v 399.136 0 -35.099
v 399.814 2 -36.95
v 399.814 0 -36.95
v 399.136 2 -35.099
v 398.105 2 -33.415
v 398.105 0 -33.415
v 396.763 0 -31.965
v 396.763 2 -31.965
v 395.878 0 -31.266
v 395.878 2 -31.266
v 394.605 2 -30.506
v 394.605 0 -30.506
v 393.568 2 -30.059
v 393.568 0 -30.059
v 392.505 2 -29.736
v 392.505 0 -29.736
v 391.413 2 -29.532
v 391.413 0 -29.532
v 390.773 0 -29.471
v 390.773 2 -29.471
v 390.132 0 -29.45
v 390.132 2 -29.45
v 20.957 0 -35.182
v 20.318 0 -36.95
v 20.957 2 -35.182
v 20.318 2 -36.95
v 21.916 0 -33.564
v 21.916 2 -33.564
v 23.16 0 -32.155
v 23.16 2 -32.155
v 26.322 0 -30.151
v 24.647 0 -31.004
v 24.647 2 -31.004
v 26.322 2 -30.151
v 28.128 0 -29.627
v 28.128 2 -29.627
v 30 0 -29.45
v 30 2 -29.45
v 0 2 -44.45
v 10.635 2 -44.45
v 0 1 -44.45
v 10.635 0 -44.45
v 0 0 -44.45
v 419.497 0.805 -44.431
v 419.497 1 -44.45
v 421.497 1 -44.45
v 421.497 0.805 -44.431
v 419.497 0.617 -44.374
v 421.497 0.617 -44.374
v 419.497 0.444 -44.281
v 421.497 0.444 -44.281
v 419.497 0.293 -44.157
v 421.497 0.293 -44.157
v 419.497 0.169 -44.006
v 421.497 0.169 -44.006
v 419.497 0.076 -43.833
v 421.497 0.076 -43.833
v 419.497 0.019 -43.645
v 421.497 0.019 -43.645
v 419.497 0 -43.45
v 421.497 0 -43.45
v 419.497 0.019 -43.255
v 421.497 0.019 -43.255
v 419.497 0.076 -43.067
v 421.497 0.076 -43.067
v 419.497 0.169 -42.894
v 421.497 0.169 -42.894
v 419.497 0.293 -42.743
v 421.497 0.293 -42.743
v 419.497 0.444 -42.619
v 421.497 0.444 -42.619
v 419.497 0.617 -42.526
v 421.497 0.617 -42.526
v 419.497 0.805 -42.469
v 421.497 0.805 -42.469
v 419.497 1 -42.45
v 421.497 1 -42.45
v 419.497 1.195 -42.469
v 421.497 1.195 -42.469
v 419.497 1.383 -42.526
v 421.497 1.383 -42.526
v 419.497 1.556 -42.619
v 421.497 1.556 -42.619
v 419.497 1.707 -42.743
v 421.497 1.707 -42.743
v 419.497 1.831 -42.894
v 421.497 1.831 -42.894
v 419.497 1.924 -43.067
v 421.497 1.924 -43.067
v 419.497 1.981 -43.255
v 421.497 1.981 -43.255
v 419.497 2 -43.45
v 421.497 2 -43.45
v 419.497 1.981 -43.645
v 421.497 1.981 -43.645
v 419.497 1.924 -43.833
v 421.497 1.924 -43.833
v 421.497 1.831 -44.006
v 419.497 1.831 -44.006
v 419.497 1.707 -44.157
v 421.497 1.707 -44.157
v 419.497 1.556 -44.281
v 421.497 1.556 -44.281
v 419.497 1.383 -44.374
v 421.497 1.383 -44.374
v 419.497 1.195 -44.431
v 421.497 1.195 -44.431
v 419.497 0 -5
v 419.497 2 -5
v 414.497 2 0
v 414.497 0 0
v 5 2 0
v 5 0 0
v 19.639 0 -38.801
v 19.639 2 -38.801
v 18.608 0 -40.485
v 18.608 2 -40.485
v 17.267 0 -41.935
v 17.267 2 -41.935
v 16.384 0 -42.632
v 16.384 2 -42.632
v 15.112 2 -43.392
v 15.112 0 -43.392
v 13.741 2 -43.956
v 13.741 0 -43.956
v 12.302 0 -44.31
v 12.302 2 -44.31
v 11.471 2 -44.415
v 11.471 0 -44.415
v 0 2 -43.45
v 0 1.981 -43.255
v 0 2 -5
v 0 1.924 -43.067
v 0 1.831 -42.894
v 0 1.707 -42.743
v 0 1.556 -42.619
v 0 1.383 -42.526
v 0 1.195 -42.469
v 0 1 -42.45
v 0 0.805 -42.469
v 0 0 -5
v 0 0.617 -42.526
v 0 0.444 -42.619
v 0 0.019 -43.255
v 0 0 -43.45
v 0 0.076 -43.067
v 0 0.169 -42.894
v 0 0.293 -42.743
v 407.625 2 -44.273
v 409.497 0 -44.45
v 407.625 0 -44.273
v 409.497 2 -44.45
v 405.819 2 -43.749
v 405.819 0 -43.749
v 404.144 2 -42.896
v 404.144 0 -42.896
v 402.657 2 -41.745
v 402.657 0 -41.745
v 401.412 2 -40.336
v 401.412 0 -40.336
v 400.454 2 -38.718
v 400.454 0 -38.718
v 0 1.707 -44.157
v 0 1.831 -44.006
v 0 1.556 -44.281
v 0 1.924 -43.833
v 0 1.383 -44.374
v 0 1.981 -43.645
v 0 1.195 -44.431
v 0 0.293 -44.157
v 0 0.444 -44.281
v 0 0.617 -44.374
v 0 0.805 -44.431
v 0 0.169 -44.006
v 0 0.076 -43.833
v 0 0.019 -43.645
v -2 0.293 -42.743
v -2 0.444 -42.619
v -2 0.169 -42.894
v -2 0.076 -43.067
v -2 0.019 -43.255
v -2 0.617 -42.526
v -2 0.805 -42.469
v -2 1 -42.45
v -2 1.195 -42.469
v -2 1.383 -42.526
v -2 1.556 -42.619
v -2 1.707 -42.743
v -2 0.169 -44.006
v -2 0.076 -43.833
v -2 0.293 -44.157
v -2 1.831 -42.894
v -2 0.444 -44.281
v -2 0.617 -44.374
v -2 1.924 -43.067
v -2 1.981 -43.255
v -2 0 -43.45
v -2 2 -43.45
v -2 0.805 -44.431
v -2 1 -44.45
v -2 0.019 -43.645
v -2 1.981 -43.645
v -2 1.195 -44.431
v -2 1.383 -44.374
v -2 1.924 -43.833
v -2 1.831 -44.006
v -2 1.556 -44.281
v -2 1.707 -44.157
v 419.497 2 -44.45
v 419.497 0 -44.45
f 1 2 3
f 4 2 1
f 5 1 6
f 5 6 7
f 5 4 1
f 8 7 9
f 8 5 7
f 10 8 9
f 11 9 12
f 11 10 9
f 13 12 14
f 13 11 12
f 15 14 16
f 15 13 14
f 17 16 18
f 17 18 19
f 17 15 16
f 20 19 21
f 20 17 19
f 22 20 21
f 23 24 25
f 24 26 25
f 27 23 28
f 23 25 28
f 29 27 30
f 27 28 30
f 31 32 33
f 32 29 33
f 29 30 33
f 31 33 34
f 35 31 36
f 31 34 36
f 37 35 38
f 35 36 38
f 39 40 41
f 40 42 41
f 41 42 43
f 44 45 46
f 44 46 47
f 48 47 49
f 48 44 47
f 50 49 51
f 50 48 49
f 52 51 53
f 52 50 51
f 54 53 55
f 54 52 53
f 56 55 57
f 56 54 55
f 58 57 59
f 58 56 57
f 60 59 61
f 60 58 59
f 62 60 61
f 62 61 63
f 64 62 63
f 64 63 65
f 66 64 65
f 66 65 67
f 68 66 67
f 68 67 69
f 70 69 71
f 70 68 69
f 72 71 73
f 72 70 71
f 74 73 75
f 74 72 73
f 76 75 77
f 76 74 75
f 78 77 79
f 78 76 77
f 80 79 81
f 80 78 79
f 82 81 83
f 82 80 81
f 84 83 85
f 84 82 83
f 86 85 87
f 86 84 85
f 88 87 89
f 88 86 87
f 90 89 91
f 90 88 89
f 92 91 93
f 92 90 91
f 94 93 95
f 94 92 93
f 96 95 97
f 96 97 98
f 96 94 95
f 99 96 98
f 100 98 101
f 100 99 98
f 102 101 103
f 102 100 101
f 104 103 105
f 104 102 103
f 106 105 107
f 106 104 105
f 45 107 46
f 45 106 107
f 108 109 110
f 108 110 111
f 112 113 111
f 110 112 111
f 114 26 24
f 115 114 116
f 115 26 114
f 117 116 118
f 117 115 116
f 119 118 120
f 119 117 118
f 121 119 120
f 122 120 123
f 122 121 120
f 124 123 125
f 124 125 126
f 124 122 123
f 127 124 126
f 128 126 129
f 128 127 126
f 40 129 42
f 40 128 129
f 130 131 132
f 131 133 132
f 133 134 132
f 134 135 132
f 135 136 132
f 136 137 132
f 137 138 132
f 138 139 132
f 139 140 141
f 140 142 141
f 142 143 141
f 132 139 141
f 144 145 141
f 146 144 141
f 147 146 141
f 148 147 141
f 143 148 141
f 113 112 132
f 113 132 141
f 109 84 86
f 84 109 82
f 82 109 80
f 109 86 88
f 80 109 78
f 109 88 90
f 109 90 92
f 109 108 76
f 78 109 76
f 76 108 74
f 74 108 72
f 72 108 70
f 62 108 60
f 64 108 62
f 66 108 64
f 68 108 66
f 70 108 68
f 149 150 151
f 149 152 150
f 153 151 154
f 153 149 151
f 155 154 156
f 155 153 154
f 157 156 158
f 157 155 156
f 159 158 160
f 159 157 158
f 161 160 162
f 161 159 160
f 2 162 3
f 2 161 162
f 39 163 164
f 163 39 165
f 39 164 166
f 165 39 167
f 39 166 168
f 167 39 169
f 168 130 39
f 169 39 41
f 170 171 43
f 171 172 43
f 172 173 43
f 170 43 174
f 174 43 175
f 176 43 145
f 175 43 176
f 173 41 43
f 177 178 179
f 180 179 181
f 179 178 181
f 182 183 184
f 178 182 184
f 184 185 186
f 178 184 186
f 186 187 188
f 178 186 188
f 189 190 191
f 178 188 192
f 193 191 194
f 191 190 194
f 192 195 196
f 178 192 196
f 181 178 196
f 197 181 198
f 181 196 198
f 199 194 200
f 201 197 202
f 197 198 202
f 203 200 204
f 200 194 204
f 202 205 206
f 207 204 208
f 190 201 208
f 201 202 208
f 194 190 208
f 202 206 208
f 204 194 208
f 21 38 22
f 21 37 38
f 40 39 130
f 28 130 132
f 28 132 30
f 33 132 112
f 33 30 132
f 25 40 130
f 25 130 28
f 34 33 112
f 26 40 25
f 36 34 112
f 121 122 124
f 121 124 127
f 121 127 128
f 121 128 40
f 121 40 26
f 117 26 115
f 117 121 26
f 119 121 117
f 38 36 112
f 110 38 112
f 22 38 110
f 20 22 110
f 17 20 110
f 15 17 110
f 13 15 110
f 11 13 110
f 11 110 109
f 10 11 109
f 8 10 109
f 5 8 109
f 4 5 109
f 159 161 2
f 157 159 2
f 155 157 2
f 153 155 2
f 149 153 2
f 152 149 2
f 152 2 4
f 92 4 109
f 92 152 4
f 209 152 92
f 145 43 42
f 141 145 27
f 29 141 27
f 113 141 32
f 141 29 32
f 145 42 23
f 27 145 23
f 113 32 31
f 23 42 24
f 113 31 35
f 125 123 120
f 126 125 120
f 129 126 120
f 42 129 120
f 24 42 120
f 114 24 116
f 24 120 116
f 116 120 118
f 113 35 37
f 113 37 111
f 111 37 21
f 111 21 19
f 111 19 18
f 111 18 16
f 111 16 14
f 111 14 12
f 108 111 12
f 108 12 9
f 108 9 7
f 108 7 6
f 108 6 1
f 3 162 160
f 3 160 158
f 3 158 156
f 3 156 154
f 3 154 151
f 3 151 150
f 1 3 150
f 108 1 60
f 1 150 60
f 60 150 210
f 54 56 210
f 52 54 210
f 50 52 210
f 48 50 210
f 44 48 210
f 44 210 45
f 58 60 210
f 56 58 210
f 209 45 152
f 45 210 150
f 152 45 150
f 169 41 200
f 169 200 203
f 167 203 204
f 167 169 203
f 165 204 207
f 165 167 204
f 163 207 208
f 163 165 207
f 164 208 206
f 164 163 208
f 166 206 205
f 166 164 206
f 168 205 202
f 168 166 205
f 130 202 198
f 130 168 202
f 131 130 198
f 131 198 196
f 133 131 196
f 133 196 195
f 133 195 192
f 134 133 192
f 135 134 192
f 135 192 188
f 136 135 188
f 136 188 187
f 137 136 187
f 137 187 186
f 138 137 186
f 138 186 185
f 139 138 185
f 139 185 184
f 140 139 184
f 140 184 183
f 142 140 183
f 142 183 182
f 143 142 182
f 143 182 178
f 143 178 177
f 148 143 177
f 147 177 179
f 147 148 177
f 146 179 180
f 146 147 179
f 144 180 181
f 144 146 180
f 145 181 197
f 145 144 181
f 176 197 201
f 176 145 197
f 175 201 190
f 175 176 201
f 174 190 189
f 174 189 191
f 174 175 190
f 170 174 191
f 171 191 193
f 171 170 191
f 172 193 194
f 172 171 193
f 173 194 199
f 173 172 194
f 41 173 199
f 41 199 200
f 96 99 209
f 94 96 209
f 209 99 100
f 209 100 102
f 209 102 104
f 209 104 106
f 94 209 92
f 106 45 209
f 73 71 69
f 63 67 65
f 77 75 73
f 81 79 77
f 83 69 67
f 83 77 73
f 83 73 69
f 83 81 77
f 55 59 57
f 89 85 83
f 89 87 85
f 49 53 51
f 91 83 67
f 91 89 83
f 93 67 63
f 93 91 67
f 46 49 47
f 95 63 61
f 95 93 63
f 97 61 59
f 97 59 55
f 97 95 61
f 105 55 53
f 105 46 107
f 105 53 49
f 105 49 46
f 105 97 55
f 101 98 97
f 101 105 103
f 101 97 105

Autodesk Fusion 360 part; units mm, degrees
sketch "Sketch1" plane through (0, 0, 0) normal (0, 1, 0) x (1, 0, 0)
  line L0 (0, 0) -> (419.4969, 0)
  line L1 (419.4969, 0) -> (419.4969, 44.45)
  line L2 (419.4969, 44.45) -> (0, 44.45)
  line L3 (0, 44.45) -> (0, 0)
  line L4 (-8.9507, 43.45) -> (460, 43.45) construction
  line L5 (-8.9686, 29.45) -> (500, 29.45) construction
  line L6 (399.4969, 0) -> (399.4969, 44.45)
  line L7 (20, 44.45) -> (20, 0)
  line L8 (20, 29.45) -> (399.4969, 29.45)
  dimension "d1" = 419.4969
  dimension "d2" = 44.45
  dimension "d3" = 1
  dimension "d13" = 14
  dimension "d14" = 20
  dimension "d15" = 20
extrude "Extrude1" add sketch "Sketch1" along normal blind 2 contours L0 L2 L3 L7 | L0 L6 L7 L8 | L0 L1 L2 L6
sketch "Sketch2" plane through (419.4969, 0, 0) normal (1, 0, 0) x (0, 0, -1)
  line L0 (0, 0) -> (44.45, 0)
  line L1 (44.45, 0) -> (44.45, 2)
  line L2 (44.45, 2) -> (0, 2)
  line L3 (0, 2) -> (0, 0)
  line L4 (43.45, 0) -> (43.45, 2) construction
  circle A0 centre (43.45, 1) radius 1
  point P0 (43.45, 0)
extrude "Extrude2" add sketch "Sketch2" along normal blind 2 contours A0
extrude "Extrude3" add sketch "Sketch2" against normal blind 2 from surface at -419.4969 contours A0
chamfer "Chamfer1" distance 5 angle 45 1 edges at (419.4969, 1, 0)
chamfer "Chamfer1" distance 5 angle 45 1 edges at (0, 1, 0)
fillet "Fillet1" radius 10 4 edges at (399.4969, 1, -44.45) (399.4969, 1, -29.45) (20, 1, -29.45) (20, 1, -44.45)
equation "d1 = 16 33/64\""
equation "d2 = 1 3/4\""
equation "d15 = d14"
